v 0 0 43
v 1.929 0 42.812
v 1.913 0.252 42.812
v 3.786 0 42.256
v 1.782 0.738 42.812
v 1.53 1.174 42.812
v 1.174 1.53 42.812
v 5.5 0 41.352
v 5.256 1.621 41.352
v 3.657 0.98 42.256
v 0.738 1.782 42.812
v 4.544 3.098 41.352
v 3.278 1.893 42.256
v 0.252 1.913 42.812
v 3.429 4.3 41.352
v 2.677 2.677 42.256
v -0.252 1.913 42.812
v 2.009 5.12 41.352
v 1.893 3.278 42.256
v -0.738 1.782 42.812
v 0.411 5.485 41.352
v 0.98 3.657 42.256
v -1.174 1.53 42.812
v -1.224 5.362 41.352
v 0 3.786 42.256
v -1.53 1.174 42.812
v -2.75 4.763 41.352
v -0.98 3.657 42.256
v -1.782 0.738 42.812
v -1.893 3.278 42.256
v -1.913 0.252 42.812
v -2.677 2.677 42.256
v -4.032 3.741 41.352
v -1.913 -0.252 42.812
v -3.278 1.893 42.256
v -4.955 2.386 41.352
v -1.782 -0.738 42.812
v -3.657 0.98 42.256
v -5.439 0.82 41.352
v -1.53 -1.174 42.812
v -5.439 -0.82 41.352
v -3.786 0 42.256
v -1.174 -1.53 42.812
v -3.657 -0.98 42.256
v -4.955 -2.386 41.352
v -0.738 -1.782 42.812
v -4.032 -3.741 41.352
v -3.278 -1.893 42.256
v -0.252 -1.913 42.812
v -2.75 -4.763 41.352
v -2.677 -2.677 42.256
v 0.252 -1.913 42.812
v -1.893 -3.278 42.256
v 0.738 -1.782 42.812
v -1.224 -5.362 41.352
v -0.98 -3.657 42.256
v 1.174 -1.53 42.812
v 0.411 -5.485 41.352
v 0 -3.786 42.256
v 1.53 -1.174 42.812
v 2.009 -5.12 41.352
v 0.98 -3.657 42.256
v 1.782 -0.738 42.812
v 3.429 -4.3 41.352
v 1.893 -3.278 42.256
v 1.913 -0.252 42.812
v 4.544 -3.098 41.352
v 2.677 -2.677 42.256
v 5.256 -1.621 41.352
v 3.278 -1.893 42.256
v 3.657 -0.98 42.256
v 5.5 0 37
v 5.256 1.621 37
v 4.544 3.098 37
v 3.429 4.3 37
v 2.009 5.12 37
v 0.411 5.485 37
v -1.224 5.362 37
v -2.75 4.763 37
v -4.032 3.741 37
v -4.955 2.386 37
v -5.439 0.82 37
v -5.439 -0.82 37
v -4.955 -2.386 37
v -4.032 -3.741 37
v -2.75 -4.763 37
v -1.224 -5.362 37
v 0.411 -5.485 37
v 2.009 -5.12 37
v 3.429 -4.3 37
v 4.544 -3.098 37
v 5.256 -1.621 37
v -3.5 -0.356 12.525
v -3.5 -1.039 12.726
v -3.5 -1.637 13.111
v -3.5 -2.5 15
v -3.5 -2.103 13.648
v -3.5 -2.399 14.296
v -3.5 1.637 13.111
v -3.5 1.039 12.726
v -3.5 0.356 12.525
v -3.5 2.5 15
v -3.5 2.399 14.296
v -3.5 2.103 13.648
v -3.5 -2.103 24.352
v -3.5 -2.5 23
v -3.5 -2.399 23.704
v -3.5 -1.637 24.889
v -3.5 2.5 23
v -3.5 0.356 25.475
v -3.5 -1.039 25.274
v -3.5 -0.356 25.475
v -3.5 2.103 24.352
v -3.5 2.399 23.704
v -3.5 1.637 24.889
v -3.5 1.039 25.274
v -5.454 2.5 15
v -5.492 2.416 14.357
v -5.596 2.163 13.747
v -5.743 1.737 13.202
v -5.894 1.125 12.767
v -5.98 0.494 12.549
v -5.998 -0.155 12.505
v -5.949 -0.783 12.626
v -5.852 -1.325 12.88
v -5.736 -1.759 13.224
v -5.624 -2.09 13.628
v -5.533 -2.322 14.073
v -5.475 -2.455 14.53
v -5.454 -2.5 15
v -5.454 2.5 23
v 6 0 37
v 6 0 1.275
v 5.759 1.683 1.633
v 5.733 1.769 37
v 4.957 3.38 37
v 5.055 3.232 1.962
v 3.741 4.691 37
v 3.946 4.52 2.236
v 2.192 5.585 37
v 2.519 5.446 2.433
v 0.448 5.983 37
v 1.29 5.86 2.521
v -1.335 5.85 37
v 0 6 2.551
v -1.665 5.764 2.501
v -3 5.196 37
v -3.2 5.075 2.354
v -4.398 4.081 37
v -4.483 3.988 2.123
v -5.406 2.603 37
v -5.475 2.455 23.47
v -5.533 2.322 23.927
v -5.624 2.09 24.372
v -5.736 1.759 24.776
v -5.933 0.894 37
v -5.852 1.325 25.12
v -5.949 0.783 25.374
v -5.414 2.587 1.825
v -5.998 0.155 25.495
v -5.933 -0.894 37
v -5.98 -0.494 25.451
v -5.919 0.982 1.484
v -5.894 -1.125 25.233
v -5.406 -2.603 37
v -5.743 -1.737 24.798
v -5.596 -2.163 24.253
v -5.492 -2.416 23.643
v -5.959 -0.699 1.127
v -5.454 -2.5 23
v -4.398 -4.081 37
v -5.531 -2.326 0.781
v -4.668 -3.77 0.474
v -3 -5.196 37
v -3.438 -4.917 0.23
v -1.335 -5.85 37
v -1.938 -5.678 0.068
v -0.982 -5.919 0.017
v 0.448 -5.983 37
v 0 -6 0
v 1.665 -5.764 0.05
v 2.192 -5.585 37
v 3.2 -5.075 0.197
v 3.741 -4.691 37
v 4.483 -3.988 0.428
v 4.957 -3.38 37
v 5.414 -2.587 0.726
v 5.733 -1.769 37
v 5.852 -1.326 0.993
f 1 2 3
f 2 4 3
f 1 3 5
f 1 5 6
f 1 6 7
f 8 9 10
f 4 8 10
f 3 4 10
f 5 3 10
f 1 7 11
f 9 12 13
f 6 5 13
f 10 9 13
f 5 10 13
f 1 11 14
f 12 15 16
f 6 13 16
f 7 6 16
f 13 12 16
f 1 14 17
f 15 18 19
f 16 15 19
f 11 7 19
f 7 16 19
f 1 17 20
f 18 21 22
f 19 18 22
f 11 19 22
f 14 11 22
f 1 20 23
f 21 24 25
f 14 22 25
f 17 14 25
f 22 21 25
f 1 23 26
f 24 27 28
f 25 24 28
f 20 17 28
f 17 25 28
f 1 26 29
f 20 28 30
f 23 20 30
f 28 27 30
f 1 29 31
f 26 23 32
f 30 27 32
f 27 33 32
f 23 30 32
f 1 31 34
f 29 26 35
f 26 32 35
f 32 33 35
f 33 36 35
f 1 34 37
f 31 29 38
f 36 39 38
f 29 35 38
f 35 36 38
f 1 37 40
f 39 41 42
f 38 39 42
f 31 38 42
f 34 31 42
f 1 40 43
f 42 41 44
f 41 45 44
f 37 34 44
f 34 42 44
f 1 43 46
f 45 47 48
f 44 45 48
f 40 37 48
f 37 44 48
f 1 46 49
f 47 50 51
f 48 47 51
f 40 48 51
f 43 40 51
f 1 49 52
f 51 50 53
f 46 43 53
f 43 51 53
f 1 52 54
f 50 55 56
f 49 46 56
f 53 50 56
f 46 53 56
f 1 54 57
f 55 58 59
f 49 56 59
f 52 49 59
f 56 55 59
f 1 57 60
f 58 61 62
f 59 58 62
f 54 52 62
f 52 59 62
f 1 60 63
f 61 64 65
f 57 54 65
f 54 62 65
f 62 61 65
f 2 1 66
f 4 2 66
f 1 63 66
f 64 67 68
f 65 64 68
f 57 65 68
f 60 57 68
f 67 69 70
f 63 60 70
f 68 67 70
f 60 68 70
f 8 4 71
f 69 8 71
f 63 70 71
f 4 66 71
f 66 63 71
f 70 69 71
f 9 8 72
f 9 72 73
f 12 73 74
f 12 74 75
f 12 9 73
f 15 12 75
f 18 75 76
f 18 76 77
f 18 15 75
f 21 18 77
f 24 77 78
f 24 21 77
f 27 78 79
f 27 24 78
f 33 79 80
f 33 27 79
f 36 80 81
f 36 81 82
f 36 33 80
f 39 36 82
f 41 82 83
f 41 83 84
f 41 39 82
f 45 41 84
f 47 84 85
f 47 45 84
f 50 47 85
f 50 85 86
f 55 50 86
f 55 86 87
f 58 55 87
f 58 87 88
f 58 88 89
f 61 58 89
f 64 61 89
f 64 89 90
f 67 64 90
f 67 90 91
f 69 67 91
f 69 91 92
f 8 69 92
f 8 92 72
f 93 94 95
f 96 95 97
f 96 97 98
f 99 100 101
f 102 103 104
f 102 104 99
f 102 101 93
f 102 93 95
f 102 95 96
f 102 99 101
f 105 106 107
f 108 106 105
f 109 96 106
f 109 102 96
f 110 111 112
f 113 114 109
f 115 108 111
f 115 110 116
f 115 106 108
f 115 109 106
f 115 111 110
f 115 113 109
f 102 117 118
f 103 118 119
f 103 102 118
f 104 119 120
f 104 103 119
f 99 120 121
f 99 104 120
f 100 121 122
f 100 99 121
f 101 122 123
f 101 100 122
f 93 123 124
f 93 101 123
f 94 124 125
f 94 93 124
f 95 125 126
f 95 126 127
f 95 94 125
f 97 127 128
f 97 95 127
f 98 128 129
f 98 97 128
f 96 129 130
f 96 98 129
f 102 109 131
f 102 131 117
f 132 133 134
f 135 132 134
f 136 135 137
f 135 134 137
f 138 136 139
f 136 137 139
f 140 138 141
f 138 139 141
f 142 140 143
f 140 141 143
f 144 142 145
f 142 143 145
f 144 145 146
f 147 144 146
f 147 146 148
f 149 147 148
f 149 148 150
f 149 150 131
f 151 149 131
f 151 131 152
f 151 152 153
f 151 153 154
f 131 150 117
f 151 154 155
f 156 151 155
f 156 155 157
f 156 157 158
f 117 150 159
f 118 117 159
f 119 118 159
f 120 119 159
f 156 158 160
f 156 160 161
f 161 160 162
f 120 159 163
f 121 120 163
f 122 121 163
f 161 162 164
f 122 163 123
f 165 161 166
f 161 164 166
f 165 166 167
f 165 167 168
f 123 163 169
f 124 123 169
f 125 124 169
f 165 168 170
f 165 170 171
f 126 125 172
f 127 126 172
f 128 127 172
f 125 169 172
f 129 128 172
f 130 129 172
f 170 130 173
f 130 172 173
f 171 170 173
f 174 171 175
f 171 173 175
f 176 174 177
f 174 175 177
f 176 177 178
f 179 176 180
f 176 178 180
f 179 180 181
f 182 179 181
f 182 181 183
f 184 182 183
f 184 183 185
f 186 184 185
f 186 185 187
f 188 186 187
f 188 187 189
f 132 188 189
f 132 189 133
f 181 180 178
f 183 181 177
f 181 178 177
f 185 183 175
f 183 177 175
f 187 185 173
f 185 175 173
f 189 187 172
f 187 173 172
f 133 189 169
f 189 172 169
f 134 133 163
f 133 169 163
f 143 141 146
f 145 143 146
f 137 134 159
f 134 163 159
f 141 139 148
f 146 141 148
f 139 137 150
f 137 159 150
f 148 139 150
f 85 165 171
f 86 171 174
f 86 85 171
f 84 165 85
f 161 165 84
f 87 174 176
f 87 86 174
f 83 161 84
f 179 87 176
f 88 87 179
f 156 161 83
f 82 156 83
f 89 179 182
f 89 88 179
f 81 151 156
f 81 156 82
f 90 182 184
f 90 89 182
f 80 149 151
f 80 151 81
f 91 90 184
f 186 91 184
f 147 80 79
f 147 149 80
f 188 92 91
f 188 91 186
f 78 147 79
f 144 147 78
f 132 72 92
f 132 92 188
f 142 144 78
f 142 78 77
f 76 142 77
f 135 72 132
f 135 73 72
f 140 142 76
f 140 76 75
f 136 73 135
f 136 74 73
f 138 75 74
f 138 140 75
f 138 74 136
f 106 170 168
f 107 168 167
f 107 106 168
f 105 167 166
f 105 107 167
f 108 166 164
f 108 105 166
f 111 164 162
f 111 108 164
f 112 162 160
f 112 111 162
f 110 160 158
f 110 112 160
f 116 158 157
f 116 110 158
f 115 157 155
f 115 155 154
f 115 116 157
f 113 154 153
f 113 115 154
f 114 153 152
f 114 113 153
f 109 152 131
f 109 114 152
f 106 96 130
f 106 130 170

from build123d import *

# Parameters (mm, degrees)
SKETCH_1_R               = 6
EXTRUDE_1_DEPTH          = 43
SKETCH_2_OUTSIDE_W       = 23.246
SKETCH_2_OUTSIDE_H       = 23.246
SKETCH_2_OUTSIDE_R       = 5.5
CUT_EXTRUDE_1_DEPTH      = 6
CUT_EXTRUDE_2_DEPTH      = 44.829214002
CUT_EXTRUDE_2_DEPTH_BACK = 44.829214002
CUT_EXTRUDE_START        = -3.5
CUT_EXTRUDE_3_DEPTH      = 41.329214002


# Read off the part's stored shape, not the designer's step: 替换面1
with BuildPart() as part:
    # 草图1 → 凸台-拉伸1 (new body)
    with BuildSketch(Plane.XY):
        Circle(SKETCH_1_R)
    extrude(amount=EXTRUDE_1_DEPTH)

    # 草图2 outside → 切除-拉伸1 (cut)
    with BuildSketch(Plane.XY.offset(43)):
        Rectangle(SKETCH_2_OUTSIDE_W, SKETCH_2_OUTSIDE_H)
        Circle(SKETCH_2_OUTSIDE_R, mode=Mode.SUBTRACT)
    extrude(amount=-CUT_EXTRUDE_1_DEPTH, mode=Mode.SUBTRACT)

    # 替换面1 outline → 替换面1 (revolve, cut)
    with BuildSketch(Plane.XZ):
        with BuildLine():
            ThreePointArc((0, 43), (2.870847837, 42.579051764), (5.500000008, 41.351646539))
            Line((5.500000008, 41.351646539), (5.500000008, 43))
            Line((5.500000008, 43), (0, 43))
        make_face()
    revolve(axis=Axis((0, 0, 0), (0, 0, 1)), mode=Mode.SUBTRACT)

    # 草图5 → 切除-拉伸2 (cut, two sides: drawn at the far end of the back side and taken through both)
    with BuildSketch(Plane(origin=(0, 0, 0), x_dir=(0, 0, -1), z_dir=(1, 0, 0)).offset(-CUT_EXTRUDE_2_DEPTH_BACK)):
        Polygon((20.642732015, -103.11641858), (0, -6), (-2.55067874, 6), (-23.193410755, 103.11641858), (171.039426405, 144.40188261), (214.875569175, -61.83095455), align=None)
    extrude(amount=CUT_EXTRUDE_2_DEPTH + CUT_EXTRUDE_2_DEPTH_BACK, mode=Mode.SUBTRACT)

    # 草图6 → 切除-拉伸3 (cut, through all)
    with BuildSketch(Plane(origin=(0, 0, 0), x_dir=(0, 0, -1), z_dir=(1, 0, 0)).offset(CUT_EXTRUDE_START)):
        with BuildLine():
            Line((-15, -2.5), (-23, -2.5))
            ThreePointArc((-23, -2.5), (-25.5, 0), (-23, 2.5))
            Line((-23, 2.5), (-15, 2.5))
            ThreePointArc((-15, 2.5), (-12.5, 0), (-15, -2.5))
        make_face()
    extrude(amount=-CUT_EXTRUDE_3_DEPTH, mode=Mode.SUBTRACT)


solid = part.part
